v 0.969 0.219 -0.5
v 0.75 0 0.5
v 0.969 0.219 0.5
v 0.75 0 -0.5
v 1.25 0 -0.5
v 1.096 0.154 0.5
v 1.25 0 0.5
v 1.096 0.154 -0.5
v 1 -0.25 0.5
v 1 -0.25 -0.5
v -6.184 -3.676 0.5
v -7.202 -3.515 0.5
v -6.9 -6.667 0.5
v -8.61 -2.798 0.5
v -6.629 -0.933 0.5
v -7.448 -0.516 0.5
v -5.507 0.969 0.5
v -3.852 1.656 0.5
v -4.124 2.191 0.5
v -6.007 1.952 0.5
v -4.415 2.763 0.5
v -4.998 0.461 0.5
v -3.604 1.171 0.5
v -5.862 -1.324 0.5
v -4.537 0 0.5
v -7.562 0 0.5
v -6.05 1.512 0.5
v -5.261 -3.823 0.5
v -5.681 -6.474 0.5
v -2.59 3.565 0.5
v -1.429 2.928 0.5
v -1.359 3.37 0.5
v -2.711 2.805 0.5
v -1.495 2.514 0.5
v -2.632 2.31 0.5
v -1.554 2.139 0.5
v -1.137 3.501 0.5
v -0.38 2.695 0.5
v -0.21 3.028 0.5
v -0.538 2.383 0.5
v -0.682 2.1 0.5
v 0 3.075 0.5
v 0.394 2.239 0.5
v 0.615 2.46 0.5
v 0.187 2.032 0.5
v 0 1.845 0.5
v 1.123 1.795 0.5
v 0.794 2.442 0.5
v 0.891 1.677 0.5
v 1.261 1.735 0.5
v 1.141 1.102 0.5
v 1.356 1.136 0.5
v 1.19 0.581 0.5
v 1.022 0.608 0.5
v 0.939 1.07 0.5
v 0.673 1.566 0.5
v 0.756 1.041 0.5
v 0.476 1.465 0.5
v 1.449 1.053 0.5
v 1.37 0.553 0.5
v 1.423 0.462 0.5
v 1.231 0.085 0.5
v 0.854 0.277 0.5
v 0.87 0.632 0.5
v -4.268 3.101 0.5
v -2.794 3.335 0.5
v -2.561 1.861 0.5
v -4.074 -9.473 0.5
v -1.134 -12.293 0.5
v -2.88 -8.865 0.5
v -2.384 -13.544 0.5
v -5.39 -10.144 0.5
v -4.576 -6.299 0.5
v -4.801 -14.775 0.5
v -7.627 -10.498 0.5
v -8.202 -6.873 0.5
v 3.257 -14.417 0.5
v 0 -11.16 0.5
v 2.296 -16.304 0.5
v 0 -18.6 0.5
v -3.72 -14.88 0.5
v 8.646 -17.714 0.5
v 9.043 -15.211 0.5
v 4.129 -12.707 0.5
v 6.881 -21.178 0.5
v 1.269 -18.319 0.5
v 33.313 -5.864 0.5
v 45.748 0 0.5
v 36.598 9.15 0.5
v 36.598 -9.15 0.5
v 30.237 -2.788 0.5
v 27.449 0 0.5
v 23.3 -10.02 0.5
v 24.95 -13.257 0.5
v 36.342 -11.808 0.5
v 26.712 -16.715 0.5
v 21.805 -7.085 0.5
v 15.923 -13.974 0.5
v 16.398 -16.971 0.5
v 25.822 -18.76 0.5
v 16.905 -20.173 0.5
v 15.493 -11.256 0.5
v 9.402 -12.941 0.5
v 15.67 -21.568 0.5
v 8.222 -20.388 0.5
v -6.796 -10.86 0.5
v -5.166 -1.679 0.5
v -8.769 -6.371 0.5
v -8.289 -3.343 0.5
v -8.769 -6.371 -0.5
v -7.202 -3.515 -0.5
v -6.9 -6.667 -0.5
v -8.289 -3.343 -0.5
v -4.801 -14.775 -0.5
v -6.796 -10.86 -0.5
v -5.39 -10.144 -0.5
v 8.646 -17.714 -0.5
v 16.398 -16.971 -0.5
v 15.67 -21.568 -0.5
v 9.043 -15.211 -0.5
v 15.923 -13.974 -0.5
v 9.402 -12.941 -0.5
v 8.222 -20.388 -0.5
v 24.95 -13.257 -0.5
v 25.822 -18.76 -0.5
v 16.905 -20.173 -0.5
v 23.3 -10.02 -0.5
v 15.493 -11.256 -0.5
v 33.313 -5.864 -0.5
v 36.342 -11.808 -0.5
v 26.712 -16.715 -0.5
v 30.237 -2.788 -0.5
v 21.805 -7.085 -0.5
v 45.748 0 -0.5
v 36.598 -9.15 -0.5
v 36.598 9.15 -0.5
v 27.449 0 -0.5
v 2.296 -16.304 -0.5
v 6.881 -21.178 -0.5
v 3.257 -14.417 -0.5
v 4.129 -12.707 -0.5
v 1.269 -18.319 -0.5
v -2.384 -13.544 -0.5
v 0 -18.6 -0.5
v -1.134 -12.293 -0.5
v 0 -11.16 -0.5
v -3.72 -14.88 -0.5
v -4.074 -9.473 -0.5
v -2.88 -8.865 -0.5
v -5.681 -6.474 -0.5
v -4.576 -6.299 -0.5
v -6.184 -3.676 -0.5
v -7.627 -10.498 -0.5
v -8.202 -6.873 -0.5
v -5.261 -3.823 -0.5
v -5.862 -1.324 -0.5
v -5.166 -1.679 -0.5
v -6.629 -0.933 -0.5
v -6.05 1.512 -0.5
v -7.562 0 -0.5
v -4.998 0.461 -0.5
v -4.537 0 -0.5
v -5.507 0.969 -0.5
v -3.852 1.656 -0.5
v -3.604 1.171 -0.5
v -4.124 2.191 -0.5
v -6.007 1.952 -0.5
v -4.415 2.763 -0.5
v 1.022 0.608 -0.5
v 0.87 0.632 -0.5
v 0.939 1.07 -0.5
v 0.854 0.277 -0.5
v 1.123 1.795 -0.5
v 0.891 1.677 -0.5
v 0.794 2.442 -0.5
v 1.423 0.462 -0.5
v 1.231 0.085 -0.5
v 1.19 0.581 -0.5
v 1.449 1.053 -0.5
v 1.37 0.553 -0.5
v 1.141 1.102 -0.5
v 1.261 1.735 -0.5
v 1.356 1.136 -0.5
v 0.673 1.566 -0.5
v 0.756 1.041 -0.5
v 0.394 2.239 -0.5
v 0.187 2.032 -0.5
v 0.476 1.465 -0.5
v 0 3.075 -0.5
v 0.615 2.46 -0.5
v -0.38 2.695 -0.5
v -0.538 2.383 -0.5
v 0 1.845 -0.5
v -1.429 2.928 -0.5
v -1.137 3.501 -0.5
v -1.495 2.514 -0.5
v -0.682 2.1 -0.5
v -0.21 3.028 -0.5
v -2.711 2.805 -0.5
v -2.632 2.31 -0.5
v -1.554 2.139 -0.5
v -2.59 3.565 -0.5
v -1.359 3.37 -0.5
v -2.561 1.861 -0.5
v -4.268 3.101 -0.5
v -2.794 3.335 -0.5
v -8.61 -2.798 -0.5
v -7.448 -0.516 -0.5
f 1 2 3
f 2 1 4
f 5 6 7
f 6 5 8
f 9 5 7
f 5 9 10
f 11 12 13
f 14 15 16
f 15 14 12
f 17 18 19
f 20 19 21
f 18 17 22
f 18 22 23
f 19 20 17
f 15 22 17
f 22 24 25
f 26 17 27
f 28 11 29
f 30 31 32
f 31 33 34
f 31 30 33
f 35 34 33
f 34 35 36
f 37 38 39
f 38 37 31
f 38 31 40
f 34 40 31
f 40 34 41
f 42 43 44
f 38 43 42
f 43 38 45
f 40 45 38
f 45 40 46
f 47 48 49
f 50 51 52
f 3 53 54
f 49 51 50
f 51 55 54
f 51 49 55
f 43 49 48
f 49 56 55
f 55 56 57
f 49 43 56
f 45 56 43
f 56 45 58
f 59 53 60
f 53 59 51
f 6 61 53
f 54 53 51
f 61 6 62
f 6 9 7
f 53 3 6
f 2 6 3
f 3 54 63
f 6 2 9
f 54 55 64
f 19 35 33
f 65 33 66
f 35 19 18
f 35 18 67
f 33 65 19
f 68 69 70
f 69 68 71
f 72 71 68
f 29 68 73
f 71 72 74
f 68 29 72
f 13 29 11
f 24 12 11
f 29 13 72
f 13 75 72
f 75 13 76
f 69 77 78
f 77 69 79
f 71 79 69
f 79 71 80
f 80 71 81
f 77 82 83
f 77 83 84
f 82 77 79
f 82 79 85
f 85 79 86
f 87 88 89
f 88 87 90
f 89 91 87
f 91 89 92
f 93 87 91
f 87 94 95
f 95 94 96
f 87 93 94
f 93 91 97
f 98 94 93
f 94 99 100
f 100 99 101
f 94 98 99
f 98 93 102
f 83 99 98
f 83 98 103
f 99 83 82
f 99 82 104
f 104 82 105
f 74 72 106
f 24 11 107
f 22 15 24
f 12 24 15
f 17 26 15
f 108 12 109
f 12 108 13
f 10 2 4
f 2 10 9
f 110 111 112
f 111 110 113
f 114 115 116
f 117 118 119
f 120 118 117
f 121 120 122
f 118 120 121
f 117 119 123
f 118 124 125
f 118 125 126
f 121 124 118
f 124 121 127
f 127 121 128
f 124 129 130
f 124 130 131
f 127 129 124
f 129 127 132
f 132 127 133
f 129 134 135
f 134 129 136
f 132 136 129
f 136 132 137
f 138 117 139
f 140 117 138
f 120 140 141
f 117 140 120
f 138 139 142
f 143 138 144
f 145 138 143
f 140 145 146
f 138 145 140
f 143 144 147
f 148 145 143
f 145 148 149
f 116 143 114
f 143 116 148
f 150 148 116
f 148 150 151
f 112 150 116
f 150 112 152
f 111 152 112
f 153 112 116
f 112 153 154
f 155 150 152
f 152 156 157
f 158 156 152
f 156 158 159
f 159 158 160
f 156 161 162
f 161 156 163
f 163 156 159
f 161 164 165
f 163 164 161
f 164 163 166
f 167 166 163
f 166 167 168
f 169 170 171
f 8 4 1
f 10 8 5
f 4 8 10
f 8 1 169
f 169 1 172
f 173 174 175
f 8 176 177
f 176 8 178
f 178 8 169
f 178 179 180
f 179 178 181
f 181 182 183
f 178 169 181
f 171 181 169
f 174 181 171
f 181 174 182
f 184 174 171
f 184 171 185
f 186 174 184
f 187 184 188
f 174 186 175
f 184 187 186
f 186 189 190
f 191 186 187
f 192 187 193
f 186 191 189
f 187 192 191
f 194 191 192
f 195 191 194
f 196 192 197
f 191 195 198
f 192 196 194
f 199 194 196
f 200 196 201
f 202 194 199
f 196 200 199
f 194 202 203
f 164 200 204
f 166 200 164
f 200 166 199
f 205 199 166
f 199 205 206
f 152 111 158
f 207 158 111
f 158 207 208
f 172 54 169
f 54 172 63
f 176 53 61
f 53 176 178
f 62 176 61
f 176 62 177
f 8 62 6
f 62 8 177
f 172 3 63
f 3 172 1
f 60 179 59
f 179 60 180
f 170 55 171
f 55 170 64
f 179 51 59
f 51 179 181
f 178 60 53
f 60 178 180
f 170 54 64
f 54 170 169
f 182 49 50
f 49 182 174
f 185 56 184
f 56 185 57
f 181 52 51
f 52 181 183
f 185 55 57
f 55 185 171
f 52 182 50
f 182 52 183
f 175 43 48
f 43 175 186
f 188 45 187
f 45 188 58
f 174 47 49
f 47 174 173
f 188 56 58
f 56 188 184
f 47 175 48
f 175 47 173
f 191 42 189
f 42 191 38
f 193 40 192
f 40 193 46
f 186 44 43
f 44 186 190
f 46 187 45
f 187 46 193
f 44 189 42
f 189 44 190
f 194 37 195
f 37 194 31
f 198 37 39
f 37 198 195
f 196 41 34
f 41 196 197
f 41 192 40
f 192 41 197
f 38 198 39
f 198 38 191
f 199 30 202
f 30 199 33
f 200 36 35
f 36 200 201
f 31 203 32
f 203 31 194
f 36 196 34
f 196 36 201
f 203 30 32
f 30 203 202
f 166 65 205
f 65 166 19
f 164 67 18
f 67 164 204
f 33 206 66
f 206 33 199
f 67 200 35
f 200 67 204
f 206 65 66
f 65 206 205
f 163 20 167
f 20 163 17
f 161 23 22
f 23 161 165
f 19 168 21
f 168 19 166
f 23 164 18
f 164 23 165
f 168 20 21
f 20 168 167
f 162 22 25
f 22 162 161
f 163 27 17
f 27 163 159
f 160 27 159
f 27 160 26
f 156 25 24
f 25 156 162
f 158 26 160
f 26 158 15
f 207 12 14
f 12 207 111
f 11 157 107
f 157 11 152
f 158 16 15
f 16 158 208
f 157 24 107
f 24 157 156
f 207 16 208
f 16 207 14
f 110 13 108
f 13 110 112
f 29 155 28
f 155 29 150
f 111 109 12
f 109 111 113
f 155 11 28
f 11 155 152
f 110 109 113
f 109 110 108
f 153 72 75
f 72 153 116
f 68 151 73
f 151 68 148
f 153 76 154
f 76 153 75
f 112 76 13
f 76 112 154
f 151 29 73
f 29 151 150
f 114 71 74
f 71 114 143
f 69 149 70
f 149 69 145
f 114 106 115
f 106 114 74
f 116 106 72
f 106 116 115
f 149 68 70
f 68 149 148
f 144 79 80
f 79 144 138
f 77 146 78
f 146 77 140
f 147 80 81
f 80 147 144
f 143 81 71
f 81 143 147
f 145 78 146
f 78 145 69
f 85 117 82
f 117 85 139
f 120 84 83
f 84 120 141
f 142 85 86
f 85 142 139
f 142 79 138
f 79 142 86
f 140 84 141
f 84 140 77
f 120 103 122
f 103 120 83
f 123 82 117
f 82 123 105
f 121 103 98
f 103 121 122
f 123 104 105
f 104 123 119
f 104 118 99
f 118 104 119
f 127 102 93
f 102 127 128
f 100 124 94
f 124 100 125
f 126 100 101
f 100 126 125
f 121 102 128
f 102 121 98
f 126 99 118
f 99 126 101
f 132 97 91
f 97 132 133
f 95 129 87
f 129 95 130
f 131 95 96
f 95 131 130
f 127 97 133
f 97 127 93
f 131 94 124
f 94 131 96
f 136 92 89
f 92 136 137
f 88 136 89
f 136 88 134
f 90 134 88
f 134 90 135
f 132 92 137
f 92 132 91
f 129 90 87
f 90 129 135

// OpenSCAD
spiral_constant=5;//[1:5]
details=2;//[1:20]
elements_in_circle=20;//[4:10]
acnt=1*1;
bcnt=0.002*spiral_constant;
angleStep=360/elements_in_circle;
$fn=2+details;

module drowElem(rad) {
  stepRad=acnt*exp(bcnt*rad);
  rotate(a=rad,v=[0,0,1]) translate([stepRad,0,0]) cylinder(h=1, r=stepRad/4, center=true);
}

for(rad=[0:angleStep:360]) {
 drowElem(rad);
}
